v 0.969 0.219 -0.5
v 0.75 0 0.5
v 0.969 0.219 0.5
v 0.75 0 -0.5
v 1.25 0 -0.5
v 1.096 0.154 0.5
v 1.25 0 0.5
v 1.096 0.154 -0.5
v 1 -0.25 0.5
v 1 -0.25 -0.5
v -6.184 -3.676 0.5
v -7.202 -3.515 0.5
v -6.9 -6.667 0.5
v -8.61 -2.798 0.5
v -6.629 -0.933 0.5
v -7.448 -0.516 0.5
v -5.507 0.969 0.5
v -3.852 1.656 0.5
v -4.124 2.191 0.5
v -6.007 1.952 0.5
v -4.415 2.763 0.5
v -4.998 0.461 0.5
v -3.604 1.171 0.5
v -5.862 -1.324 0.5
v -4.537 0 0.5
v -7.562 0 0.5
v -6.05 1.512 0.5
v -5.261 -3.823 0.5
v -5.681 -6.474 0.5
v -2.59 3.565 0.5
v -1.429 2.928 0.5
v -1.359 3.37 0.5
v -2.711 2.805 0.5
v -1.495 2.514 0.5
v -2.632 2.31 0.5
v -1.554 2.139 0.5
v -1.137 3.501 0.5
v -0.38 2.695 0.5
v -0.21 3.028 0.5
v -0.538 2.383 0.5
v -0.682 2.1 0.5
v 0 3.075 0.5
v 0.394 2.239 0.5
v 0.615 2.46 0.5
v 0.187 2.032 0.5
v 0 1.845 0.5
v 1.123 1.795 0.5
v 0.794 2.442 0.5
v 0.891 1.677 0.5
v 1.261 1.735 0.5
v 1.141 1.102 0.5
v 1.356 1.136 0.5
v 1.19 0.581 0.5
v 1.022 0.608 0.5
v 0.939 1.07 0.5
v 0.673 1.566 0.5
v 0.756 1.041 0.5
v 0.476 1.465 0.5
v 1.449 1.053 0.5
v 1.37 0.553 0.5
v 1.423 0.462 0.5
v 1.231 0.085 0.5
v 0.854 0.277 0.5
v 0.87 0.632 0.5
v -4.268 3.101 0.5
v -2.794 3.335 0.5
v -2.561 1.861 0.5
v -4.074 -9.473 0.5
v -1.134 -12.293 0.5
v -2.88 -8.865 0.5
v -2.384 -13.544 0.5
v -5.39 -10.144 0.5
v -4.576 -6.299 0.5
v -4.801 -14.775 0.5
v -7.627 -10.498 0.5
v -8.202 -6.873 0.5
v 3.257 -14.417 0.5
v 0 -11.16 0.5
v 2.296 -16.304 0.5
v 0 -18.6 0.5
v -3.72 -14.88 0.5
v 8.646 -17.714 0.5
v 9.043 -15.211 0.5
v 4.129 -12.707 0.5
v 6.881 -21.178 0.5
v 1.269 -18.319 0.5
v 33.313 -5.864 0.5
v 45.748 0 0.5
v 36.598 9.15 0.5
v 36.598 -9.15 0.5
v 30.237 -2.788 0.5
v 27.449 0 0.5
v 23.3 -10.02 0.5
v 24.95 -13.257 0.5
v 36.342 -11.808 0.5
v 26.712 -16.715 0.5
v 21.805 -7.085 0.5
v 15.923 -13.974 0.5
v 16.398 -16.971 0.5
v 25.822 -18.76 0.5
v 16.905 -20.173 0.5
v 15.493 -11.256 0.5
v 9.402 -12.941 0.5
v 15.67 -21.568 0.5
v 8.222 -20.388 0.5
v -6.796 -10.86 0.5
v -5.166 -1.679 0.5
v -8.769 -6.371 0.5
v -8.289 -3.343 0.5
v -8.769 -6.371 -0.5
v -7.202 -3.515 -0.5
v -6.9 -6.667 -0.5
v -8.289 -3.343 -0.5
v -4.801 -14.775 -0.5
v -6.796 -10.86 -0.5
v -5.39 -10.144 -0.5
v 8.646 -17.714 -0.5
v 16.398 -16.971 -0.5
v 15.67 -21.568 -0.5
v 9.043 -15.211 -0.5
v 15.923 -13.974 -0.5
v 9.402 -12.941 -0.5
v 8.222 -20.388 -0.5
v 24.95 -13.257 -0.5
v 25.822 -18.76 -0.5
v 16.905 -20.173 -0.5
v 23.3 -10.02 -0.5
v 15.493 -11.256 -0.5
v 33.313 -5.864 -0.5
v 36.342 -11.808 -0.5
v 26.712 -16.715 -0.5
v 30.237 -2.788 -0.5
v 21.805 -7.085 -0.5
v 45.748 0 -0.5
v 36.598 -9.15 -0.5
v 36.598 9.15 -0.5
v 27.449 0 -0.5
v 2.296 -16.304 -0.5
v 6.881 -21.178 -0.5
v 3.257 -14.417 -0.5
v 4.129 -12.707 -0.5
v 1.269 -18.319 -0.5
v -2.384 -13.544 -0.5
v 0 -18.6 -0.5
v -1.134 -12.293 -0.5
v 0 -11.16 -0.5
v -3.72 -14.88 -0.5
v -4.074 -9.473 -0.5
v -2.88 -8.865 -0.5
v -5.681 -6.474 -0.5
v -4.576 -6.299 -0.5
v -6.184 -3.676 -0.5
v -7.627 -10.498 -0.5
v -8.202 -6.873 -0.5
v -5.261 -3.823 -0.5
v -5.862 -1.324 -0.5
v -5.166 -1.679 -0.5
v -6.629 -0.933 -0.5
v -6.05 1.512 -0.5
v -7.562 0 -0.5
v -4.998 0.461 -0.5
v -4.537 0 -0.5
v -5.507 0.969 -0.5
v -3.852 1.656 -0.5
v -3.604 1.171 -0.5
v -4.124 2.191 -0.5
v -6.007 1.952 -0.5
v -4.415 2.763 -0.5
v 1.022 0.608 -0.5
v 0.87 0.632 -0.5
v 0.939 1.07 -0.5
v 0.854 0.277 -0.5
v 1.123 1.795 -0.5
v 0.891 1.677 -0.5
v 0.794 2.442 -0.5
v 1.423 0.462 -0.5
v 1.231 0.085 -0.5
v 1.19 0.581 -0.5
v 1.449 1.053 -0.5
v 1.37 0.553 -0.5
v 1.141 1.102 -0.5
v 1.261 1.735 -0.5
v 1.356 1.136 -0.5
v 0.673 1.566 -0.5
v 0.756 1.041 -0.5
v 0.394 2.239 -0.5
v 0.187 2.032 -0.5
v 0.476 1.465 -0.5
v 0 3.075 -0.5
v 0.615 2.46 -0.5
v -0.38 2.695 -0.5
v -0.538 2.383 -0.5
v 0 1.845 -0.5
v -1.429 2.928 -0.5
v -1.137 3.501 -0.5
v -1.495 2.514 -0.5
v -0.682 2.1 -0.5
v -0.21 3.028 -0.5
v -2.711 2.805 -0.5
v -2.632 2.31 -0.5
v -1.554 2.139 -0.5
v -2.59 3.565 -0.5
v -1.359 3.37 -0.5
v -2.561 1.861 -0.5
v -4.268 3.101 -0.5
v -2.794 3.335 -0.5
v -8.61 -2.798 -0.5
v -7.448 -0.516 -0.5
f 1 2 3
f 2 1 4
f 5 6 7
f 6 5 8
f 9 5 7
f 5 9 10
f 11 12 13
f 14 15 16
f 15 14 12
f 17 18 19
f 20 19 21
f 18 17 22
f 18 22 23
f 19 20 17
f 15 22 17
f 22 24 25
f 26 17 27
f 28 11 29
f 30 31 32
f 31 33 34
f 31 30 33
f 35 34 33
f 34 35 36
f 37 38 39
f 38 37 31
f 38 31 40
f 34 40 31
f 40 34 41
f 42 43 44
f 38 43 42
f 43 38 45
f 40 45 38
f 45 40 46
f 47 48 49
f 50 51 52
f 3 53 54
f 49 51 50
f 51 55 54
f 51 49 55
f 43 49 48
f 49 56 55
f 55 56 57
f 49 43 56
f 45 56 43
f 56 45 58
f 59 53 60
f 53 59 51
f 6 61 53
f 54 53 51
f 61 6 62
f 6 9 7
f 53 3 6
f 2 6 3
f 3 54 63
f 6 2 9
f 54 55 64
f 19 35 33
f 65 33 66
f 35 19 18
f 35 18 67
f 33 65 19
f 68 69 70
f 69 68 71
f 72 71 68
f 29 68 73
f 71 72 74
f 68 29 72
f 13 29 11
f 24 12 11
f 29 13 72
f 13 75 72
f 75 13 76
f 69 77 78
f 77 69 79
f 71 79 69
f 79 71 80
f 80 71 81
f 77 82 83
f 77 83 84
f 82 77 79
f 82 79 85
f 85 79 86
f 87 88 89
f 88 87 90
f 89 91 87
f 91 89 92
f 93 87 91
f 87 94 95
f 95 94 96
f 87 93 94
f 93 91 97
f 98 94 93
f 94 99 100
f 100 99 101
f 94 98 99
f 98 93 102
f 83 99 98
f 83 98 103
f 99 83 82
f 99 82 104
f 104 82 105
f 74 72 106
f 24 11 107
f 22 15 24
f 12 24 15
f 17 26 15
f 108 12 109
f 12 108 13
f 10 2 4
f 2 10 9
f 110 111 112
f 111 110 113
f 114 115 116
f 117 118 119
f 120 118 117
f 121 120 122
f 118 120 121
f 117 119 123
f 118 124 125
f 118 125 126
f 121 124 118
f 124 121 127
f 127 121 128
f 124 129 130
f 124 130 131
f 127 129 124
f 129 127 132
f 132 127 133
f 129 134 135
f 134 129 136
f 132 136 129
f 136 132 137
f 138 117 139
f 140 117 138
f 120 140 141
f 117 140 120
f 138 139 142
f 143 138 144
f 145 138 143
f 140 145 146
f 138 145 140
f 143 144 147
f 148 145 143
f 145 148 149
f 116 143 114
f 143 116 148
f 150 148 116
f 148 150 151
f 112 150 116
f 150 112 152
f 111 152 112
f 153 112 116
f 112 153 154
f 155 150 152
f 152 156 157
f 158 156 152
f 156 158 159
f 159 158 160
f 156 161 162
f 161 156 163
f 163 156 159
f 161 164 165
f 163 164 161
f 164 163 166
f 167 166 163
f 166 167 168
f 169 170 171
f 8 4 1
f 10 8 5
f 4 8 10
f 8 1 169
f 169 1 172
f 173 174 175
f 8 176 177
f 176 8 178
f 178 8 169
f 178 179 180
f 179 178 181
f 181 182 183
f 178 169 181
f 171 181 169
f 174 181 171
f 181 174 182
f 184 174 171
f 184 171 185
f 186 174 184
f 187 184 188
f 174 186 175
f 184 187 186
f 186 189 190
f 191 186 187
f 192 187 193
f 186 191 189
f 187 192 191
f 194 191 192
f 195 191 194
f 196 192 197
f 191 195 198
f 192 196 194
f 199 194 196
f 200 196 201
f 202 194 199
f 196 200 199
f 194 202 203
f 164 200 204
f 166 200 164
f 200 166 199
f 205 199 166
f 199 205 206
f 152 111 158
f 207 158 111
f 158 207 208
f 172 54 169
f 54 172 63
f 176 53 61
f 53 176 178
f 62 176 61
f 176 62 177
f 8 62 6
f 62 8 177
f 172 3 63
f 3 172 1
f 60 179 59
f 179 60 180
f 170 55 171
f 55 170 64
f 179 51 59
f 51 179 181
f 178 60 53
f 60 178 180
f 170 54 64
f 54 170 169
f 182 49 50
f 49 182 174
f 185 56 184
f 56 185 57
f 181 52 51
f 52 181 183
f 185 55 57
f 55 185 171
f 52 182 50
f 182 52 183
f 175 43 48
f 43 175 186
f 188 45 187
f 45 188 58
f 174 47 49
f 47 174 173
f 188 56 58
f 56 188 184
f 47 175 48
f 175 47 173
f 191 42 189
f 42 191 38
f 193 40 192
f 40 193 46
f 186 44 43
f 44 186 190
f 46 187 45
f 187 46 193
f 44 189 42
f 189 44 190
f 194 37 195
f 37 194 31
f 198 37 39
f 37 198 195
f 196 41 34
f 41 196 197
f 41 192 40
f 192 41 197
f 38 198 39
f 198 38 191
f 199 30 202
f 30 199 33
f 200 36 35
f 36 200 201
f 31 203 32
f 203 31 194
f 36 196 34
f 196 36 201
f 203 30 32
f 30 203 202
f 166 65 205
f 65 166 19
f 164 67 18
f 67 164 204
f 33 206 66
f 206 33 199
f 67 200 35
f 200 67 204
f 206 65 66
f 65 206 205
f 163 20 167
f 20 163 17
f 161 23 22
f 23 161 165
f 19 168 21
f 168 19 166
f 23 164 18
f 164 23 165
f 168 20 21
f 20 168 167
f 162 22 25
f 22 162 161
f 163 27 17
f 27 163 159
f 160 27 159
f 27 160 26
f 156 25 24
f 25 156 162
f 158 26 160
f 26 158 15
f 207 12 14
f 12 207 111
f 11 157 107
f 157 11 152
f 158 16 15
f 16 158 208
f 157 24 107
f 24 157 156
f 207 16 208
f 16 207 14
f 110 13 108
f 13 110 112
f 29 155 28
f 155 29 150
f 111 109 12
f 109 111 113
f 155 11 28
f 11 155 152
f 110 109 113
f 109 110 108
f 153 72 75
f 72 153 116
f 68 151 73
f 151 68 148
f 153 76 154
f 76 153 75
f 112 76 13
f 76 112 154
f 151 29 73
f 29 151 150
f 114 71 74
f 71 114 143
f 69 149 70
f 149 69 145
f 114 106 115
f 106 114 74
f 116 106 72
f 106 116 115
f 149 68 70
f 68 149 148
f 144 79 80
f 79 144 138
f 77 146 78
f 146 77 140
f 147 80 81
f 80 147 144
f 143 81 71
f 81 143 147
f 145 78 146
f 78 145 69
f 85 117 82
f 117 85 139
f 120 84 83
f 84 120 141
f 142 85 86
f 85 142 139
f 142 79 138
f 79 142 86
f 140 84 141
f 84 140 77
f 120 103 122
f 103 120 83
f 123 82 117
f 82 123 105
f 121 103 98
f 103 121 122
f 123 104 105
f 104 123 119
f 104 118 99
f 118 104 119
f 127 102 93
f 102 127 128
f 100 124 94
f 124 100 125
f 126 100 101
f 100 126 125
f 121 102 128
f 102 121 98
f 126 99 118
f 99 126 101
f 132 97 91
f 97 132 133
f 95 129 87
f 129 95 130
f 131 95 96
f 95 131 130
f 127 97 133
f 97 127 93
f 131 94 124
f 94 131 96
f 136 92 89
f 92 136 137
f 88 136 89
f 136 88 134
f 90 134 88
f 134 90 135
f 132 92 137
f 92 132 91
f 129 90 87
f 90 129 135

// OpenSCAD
spiral_constant=5;//[1:5]
details=2;//[1:20]
elements_in_circle=20;//[4:10]
acnt=1*1;
bcnt=0.002*spiral_constant;
angleStep=360/elements_in_circle;
$fn=2+details;

module drowElem(rad) {
  stepRad=acnt*exp(bcnt*rad);
  rotate(a=rad,v=[0,0,1]) translate([stepRad,0,0]) cylinder(h=1, r=stepRad/4, center=true);
}

for(rad=[0:angleStep:360]) {
 drowElem(rad);
}
